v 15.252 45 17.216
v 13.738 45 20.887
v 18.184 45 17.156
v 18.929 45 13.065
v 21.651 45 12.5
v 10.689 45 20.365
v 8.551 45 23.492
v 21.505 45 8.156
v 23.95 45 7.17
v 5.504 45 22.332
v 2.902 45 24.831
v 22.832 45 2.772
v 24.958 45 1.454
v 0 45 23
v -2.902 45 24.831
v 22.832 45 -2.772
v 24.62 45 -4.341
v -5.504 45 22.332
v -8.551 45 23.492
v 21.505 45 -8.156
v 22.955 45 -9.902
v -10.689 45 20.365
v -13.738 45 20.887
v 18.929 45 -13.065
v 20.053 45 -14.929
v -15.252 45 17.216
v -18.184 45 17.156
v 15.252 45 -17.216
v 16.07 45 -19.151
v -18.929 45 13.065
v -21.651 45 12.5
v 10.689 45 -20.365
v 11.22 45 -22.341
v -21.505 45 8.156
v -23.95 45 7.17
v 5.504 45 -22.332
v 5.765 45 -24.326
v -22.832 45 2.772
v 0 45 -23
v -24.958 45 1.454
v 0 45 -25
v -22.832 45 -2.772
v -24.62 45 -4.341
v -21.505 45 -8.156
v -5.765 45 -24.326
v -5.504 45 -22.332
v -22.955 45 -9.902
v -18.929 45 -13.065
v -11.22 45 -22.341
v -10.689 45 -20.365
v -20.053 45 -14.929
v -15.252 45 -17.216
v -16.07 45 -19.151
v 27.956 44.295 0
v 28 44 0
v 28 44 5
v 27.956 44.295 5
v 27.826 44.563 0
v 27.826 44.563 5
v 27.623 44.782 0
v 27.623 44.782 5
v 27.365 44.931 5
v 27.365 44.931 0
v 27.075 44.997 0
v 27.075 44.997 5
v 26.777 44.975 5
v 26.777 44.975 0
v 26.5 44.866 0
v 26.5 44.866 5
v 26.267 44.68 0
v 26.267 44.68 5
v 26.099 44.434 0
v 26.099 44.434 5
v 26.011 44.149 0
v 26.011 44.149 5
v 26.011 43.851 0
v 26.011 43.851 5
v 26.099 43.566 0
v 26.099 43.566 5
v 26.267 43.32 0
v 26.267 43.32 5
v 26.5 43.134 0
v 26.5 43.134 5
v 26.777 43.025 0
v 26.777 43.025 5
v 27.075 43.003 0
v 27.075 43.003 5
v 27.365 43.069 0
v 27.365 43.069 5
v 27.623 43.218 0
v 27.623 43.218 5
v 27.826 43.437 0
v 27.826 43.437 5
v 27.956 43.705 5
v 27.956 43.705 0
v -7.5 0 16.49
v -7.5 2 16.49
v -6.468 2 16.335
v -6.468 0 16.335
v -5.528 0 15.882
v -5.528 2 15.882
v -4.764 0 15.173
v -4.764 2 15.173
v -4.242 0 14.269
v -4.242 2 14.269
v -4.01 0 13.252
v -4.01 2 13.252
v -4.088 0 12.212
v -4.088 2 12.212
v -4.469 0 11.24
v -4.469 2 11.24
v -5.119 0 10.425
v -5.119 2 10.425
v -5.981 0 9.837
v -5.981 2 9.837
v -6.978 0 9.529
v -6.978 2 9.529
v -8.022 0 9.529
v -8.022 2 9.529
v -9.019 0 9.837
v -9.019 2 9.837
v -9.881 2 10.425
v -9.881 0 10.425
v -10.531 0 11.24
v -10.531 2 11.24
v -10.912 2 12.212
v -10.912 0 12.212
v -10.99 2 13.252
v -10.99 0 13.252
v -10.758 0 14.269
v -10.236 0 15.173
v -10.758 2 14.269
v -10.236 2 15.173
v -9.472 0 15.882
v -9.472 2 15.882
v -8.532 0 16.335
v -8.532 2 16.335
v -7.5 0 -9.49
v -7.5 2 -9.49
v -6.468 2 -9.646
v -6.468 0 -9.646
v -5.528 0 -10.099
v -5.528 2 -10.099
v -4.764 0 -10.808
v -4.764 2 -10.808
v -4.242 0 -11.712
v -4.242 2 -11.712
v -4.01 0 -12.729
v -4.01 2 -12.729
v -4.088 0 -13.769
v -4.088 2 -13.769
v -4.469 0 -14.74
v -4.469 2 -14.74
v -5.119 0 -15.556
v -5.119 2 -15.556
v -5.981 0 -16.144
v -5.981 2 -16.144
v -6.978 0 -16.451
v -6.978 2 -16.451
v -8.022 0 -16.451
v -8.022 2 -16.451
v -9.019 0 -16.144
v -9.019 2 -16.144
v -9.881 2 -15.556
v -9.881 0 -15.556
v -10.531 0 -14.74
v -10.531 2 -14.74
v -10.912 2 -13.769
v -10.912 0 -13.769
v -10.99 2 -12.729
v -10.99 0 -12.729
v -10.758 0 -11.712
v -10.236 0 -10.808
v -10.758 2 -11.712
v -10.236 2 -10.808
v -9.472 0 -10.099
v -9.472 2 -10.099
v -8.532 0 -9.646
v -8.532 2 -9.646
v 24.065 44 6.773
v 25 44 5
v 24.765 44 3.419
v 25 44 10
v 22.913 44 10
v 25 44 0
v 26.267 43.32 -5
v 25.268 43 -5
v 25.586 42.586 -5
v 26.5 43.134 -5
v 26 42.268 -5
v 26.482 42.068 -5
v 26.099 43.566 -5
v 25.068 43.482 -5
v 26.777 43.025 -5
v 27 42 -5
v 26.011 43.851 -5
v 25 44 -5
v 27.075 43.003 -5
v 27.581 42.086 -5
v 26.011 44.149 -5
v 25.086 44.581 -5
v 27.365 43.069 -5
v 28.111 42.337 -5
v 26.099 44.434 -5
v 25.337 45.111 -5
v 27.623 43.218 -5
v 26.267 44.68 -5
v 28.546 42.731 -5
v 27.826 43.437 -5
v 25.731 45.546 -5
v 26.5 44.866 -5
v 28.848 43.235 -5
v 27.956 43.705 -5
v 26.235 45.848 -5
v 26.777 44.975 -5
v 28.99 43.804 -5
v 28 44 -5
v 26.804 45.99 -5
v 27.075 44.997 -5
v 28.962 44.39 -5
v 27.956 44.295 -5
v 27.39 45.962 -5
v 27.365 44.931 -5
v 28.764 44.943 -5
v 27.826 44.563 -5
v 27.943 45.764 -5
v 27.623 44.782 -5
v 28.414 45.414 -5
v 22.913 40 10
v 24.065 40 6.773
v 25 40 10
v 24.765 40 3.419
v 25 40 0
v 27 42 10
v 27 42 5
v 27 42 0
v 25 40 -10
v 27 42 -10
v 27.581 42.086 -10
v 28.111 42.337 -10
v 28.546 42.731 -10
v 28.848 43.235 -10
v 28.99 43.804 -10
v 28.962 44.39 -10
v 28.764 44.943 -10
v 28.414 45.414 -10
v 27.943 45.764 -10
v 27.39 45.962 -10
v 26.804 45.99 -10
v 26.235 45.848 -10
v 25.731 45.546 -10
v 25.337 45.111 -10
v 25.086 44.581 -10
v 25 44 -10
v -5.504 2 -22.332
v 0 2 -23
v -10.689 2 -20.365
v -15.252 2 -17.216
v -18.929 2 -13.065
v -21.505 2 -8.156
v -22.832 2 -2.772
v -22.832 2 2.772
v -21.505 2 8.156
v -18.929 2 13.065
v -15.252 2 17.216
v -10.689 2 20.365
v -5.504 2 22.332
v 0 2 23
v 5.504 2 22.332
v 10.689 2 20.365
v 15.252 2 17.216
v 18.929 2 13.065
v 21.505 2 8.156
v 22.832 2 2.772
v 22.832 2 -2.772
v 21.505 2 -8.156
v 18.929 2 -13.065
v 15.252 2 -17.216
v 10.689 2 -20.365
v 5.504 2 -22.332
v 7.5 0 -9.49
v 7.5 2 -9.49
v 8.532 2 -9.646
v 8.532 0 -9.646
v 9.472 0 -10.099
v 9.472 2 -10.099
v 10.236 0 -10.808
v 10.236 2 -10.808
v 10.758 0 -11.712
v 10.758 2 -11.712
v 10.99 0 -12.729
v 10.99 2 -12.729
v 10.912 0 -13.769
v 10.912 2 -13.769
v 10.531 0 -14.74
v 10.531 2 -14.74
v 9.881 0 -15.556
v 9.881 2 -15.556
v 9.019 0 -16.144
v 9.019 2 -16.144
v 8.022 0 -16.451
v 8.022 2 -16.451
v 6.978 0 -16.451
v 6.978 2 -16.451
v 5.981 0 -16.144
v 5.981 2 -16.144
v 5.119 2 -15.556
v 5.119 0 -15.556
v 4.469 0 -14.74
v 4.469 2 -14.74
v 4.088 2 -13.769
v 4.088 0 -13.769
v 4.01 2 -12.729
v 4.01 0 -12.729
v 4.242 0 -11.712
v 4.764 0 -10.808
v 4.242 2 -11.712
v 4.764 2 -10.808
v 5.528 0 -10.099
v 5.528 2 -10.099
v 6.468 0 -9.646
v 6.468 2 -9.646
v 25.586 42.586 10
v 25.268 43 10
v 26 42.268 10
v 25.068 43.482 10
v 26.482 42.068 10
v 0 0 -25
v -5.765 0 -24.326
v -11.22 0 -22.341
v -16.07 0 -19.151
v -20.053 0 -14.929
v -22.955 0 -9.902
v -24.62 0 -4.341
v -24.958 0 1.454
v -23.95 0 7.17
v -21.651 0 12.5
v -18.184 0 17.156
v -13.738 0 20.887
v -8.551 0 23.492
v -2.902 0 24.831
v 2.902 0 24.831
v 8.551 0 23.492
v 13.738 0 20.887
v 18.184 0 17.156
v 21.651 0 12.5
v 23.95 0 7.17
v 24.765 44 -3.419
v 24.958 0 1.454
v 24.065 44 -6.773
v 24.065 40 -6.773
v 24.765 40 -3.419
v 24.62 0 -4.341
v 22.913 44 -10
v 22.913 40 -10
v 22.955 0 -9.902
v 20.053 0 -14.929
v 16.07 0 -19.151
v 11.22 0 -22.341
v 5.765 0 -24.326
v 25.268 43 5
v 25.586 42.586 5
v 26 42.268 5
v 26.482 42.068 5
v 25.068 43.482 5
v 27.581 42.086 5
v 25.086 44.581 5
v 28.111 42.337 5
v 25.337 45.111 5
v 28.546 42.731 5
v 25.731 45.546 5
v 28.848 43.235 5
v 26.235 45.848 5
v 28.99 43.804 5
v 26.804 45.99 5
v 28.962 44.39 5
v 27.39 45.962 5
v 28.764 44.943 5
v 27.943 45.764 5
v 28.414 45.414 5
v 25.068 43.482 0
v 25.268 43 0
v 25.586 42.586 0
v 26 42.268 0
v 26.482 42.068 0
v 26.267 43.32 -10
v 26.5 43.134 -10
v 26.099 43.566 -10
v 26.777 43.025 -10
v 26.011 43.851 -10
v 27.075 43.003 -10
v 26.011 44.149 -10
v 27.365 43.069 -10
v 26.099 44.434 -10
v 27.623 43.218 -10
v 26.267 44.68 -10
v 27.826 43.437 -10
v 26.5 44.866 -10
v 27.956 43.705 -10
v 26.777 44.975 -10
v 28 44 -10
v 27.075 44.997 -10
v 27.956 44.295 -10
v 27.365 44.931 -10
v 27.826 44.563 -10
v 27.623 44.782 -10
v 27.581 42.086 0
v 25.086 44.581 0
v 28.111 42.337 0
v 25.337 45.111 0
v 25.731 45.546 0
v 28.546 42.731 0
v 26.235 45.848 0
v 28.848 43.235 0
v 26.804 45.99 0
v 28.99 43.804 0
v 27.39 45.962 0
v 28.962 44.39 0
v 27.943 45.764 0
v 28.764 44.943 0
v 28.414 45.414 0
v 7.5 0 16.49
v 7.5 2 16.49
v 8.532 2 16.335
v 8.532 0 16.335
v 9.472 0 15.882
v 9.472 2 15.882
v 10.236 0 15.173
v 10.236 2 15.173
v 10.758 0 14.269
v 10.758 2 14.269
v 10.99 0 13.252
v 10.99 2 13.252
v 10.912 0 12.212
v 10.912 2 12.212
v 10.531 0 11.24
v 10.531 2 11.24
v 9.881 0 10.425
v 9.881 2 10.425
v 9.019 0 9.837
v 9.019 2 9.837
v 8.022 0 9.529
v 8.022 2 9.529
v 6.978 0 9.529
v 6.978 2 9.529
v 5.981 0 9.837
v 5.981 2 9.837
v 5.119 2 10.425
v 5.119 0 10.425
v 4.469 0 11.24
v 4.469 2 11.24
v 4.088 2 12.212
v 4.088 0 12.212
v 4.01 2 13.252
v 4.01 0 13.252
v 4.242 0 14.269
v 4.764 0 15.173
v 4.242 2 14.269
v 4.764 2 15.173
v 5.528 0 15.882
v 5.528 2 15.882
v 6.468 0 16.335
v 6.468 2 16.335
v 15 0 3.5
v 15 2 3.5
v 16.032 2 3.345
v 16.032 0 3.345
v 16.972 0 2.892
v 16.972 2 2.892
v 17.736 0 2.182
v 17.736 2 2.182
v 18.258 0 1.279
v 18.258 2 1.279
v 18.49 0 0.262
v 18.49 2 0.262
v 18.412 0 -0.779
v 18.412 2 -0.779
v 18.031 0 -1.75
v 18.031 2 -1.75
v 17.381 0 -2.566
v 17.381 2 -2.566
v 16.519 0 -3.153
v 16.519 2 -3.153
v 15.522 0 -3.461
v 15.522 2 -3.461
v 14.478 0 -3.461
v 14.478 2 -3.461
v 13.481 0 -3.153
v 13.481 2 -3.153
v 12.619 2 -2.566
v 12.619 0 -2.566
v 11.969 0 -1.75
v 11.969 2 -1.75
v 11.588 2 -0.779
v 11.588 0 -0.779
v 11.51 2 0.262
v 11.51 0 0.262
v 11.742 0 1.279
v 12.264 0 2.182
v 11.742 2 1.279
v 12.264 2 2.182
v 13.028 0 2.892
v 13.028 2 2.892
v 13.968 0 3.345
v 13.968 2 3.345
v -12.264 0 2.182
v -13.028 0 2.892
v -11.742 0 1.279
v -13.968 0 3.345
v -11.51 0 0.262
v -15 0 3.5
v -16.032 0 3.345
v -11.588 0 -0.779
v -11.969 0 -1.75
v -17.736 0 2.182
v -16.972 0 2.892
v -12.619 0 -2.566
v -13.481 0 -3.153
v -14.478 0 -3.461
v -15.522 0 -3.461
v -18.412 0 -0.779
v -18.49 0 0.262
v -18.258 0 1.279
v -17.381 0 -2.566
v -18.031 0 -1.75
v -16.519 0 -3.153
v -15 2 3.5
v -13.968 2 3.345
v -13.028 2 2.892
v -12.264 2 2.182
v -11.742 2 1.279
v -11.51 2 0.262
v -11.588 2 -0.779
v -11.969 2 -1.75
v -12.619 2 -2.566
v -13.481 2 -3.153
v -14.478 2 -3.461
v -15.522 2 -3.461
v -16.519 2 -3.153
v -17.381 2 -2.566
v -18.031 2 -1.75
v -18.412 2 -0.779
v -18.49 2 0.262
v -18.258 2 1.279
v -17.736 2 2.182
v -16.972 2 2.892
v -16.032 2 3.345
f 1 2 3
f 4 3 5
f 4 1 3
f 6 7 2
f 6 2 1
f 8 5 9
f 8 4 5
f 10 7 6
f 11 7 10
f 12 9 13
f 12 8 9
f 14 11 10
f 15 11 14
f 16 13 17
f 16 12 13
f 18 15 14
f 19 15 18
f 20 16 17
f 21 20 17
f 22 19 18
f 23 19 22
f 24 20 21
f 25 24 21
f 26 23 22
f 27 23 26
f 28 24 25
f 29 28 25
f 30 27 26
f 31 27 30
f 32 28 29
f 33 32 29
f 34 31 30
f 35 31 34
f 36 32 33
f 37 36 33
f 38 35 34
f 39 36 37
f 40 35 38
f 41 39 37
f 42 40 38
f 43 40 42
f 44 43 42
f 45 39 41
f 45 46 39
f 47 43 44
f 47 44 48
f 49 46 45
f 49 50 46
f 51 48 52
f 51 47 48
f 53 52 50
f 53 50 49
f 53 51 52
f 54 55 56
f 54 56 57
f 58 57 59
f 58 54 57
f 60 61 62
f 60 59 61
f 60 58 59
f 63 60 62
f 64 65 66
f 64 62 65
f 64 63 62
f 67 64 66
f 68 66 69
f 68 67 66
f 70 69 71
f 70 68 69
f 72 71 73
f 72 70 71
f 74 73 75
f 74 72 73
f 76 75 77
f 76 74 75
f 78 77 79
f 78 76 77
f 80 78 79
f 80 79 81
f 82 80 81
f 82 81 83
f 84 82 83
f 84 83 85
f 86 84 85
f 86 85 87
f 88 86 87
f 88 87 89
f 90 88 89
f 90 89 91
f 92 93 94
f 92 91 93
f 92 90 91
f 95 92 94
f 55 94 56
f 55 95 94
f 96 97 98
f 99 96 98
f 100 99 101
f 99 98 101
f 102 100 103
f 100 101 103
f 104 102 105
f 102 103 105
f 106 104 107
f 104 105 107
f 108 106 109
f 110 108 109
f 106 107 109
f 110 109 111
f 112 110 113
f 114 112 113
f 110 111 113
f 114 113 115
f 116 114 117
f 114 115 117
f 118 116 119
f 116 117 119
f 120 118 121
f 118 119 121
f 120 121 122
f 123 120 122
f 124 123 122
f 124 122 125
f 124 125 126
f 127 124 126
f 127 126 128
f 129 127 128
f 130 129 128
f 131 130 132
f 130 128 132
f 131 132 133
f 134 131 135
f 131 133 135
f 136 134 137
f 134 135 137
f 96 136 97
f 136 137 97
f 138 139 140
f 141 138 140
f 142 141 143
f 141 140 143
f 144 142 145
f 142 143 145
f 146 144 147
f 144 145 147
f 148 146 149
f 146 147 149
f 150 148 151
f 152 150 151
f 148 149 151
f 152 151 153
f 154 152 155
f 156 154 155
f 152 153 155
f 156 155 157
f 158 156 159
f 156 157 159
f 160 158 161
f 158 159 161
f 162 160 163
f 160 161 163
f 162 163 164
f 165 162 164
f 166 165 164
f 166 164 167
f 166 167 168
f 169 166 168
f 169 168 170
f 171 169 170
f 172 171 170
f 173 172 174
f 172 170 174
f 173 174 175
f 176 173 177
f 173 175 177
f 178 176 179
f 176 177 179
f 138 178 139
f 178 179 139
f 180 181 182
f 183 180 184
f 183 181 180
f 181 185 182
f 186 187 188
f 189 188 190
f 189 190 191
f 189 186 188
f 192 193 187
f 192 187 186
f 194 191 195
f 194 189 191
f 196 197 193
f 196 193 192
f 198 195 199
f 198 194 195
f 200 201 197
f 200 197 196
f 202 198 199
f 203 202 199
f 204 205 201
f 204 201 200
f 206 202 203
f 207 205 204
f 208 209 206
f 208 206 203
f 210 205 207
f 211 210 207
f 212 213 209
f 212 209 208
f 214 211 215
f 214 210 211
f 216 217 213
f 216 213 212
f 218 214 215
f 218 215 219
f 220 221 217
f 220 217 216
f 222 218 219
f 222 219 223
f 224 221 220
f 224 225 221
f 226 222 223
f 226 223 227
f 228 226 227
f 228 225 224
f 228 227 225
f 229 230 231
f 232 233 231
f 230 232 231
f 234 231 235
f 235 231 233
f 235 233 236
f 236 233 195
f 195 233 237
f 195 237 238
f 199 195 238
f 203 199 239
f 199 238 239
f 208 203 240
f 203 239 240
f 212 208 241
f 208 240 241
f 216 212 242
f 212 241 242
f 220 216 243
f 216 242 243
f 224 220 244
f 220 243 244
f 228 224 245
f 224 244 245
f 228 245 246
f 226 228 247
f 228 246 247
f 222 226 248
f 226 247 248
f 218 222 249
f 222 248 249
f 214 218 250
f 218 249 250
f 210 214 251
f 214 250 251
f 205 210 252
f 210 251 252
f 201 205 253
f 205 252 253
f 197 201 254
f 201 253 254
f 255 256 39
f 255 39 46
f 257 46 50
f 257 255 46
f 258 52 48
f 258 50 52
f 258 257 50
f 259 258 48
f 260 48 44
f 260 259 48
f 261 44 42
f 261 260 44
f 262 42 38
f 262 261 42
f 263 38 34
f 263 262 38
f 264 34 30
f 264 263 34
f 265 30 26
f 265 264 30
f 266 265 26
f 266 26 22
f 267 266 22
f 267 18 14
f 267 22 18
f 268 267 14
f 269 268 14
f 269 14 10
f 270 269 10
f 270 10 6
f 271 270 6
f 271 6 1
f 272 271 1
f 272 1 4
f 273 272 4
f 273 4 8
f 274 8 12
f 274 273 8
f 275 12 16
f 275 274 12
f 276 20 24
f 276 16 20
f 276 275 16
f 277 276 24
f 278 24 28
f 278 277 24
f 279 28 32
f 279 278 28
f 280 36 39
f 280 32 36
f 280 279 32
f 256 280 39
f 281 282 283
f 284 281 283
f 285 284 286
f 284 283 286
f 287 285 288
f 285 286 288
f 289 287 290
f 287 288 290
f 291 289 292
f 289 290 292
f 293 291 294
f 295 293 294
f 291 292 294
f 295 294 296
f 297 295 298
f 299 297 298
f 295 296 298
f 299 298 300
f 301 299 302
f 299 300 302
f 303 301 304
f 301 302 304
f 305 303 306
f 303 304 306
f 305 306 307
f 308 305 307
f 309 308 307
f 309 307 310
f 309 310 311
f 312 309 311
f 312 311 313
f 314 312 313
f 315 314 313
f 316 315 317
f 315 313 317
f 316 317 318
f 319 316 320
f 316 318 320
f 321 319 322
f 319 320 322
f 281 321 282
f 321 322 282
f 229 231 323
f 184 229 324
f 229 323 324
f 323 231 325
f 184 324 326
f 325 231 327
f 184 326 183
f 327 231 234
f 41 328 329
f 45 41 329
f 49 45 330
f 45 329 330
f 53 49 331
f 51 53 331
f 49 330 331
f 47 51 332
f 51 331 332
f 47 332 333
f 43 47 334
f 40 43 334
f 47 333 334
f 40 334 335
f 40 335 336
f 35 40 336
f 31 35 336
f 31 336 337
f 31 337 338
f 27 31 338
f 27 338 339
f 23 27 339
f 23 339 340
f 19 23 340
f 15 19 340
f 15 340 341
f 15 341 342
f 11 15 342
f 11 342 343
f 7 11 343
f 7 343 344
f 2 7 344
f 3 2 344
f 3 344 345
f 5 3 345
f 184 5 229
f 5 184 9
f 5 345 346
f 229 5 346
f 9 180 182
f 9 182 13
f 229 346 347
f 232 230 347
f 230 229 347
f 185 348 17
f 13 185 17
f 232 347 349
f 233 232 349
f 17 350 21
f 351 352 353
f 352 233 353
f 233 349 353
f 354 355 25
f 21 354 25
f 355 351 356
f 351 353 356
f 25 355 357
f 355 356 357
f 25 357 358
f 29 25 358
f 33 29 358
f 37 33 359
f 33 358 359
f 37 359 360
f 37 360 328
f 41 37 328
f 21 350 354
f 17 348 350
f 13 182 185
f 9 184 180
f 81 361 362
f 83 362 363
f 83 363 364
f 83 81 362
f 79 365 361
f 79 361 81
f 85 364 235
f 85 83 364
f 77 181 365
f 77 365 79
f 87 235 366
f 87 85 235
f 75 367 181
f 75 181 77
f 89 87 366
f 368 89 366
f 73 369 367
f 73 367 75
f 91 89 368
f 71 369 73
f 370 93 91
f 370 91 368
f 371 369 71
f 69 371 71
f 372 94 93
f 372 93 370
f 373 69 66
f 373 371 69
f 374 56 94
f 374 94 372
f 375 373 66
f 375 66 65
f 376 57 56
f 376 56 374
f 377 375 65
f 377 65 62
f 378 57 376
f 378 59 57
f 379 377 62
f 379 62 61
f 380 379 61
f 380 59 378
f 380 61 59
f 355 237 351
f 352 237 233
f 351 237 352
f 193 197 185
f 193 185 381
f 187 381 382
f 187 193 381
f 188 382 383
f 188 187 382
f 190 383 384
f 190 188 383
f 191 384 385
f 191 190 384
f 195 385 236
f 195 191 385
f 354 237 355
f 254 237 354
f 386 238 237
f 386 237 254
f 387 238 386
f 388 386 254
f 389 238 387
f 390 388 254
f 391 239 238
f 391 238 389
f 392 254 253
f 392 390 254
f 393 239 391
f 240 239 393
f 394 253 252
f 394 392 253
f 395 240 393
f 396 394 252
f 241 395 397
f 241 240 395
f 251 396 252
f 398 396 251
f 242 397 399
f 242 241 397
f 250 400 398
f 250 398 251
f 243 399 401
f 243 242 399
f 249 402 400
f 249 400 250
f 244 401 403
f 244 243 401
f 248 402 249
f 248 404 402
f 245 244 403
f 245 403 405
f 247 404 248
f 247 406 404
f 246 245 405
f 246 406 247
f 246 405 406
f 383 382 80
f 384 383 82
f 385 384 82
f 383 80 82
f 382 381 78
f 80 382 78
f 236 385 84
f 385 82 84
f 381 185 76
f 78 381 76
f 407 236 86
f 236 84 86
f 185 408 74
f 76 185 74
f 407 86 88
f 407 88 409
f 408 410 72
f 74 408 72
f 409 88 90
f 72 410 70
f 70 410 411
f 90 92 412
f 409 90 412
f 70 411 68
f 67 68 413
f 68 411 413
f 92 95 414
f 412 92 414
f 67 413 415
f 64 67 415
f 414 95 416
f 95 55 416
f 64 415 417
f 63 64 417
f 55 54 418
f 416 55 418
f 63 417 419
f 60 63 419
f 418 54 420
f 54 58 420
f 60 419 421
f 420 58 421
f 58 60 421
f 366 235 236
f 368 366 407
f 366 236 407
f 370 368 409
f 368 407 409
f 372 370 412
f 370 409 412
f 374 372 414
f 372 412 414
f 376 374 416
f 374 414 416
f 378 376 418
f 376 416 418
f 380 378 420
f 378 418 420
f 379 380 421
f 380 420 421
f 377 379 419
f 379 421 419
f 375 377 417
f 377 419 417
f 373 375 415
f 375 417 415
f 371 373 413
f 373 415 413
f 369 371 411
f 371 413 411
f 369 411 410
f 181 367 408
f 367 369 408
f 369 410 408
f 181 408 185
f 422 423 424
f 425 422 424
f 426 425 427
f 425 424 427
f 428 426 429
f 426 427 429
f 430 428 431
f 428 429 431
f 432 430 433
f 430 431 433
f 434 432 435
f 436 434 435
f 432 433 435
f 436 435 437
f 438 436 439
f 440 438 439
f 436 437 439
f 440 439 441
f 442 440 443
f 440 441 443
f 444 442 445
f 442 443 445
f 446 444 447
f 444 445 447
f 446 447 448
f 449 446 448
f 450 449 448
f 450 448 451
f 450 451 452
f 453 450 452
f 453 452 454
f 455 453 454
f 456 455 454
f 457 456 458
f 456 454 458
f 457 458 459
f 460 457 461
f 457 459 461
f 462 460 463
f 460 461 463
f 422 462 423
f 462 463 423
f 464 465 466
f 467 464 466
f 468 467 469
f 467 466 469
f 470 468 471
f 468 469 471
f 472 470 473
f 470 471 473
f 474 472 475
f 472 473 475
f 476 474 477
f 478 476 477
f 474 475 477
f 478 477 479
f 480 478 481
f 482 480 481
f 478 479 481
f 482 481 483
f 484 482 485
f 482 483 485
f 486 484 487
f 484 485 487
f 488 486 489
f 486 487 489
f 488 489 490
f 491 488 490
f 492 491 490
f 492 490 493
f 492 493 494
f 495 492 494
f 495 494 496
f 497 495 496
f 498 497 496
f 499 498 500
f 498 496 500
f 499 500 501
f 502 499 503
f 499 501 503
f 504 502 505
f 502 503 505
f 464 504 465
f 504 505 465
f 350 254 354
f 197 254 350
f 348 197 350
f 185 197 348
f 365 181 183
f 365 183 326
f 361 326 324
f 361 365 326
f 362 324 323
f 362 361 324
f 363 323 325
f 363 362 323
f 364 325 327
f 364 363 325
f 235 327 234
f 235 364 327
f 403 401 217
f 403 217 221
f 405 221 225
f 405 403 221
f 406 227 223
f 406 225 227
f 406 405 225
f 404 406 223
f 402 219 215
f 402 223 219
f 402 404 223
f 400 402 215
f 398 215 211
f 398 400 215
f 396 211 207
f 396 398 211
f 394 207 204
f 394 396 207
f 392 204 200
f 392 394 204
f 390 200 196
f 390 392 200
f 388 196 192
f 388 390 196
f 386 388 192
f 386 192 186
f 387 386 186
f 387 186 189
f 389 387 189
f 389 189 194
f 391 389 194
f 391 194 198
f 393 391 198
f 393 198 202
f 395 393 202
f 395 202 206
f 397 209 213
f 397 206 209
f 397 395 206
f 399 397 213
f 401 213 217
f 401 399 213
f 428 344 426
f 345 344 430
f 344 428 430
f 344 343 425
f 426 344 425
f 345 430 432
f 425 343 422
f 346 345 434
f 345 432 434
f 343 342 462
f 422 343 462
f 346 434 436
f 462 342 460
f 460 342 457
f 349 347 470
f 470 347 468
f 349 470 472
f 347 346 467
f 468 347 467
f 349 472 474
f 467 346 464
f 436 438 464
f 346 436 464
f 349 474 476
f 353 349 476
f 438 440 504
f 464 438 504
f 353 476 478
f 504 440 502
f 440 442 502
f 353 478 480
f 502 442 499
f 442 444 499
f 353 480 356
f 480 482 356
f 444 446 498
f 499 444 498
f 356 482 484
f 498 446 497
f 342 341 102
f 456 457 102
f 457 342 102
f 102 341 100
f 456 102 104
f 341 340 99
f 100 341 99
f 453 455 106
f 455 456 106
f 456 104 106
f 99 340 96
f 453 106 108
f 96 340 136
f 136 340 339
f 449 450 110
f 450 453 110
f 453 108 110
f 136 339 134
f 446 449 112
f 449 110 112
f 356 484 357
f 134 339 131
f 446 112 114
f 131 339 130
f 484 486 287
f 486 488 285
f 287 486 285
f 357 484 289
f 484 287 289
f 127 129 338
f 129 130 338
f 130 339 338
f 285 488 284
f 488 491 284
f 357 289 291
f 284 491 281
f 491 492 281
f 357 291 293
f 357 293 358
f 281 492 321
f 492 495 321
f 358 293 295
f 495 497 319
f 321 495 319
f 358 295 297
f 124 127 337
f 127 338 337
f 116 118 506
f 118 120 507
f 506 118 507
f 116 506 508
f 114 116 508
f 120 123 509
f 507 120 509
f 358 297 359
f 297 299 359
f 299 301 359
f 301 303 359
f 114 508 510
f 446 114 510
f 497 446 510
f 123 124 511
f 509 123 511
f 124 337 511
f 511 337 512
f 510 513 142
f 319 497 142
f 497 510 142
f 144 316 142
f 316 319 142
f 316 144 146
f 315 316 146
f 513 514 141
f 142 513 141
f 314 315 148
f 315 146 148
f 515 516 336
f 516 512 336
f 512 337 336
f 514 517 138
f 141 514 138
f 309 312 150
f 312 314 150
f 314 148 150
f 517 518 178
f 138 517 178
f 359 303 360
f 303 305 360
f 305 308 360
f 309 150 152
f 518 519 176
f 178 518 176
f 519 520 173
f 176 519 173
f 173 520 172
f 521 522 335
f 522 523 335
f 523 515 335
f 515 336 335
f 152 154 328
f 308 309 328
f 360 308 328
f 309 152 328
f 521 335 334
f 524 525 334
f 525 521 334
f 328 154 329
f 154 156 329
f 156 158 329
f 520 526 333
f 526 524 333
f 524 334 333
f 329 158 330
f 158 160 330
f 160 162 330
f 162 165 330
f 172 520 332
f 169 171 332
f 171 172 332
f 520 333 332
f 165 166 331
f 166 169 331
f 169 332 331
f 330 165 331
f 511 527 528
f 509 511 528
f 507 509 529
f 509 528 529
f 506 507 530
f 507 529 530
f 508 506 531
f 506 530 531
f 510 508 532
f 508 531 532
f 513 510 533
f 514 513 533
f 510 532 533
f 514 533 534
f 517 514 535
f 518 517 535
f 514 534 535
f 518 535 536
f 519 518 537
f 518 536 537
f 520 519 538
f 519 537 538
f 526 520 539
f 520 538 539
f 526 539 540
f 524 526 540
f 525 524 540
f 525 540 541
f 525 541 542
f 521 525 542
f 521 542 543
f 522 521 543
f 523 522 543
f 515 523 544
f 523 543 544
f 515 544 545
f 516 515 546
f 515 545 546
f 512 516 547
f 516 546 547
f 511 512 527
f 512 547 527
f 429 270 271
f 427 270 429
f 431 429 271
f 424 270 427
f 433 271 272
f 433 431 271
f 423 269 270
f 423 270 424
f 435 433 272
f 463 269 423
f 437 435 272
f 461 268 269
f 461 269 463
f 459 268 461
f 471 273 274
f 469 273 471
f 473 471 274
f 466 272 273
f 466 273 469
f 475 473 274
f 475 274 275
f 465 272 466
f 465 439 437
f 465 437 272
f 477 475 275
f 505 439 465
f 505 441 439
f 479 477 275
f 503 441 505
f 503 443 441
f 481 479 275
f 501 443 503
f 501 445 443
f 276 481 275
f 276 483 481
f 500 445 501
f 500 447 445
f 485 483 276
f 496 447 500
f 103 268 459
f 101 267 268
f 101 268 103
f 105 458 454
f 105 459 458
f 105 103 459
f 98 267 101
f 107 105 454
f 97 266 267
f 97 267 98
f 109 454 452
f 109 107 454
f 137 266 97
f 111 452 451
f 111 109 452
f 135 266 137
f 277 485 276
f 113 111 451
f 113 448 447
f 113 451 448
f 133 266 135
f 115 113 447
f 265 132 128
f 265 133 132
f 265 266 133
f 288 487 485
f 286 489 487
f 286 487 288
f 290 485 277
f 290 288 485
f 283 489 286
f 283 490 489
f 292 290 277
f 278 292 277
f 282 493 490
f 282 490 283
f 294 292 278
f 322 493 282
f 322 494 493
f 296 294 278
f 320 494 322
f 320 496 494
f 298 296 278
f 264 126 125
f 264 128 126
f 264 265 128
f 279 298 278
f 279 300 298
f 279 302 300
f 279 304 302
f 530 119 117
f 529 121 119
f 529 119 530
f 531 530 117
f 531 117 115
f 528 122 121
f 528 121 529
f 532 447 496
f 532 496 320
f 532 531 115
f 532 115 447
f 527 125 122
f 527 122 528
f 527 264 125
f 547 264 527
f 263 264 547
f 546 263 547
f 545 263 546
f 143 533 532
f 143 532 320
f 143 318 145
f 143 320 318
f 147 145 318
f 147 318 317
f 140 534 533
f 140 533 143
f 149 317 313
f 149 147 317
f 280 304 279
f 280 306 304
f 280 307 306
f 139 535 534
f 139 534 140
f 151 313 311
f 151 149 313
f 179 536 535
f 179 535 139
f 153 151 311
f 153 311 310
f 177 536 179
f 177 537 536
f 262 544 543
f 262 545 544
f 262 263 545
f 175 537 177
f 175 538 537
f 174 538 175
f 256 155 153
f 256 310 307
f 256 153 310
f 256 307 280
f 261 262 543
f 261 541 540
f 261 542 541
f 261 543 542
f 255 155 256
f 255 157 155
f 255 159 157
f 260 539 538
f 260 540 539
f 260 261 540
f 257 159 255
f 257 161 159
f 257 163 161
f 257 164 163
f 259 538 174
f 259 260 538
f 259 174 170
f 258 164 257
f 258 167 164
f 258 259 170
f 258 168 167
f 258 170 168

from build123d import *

# Parameters (mm, degrees)
SKETCH1_R                = 25
BOSS_EXTRUDE1_DEPTH      = 45
SHELL1_T                 = -2
SKETCH2_R                = 3.5
CUT_EXTRUDE1_DEPTH       = 2
BOSS_EXTRUDE4_DEPTH      = 10
BOSS_EXTRUDE4_DEPTH_BACK = 10
BOSS_EXTRUDE6_REACH      = 74.395
SKETCH8_W                = 20
SKETCH8_H                = 4
CUT_EXTRUDE4_DEPTH       = 65.668384857
CUT_EXTRUDE4_DEPTH_BACK  = 65.668384857
SKETCH9_R                = 1
CUT_EXTRUDE5_START       = -5
SKETCH10_R               = 2
CUT_EXTRUDE5_DEPTH       = 5
LPATTERN2_COUNT          = 2
LPATTERN2_PITCH          = 10


with BuildPart() as part:
    # Sketch1 → Boss-Extrude1 (new body)
    with BuildSketch(Plane(origin=(0, 0, 0), x_dir=(1, 0, 0), z_dir=(0, 1, 0))):
        with Locations(Location((0, 0, 0), (0, 0, 90))):
            Circle(SKETCH1_R)
    extrude(amount=BOSS_EXTRUDE1_DEPTH)

    # Shell1
    shell1_openings = [part.faces().sort_by_distance(p)[0] for p in [
        (0, 45, 0),
    ]]
    offset(amount=SHELL1_T, openings=shell1_openings, kind=Kind.INTERSECTION)

    # Sketch2 → Cut-Extrude1 (cut)
    with BuildSketch(Plane(origin=(0, 2, 0), x_dir=(1, 0, 0), z_dir=(0, 1, 0))):
        with Locations(Location((15, 0, 0), (0, 0, 270))):
            Circle(SKETCH2_R)
        with Locations(Location((7.5, -12.990381057, 0), (0, 0, 270))):
            Circle(SKETCH2_R)
        with Locations(Location((-7.5, -12.990381057, 0), (0, 0, 270))):
            Circle(SKETCH2_R)
        with Locations(Location((-15, 0, 0), (0, 0, 270))):
            Circle(SKETCH2_R)
        with Locations(Location((-7.5, 12.990381057, 0), (0, 0, 270))):
            Circle(SKETCH2_R)
        with Locations(Location((7.5, 12.990381057, 0), (0, 0, 270))):
            Circle(SKETCH2_R)
    extrude(amount=-CUT_EXTRUDE1_DEPTH, mode=Mode.SUBTRACT)

    # Sketch8 → Boss-Extrude6 (add, up to next)
    with BuildSketch(Plane.ZY.offset(-25), mode=Mode.PRIVATE) as boss_extrude6_sk1:
        with Locations((0, 42)):
            Rectangle(SKETCH8_W, SKETCH8_H)
    boss_extrude6_tool1 = extrude(boss_extrude6_sk1.sketch, amount=BOSS_EXTRUDE6_REACH, mode=Mode.PRIVATE) - part.part


with BuildPart() as body_2:
    # Sketch3 → Boss-Extrude4 (new, two sides: drawn at the far end of the back side and taken through both)
    with BuildSketch(Plane.XY.offset(-BOSS_EXTRUDE4_DEPTH_BACK)):
        with BuildLine():
            Line((25, 44), (25, 40))
            Line((25, 40), (27, 42))
            ThreePointArc((27, 42), (28.414213562, 45.414213562), (25, 44))
        make_face()
    extrude(amount=BOSS_EXTRUDE4_DEPTH + BOSS_EXTRUDE4_DEPTH_BACK)


with BuildPart() as part_1:
    add(part.part)

    add(body_2.part)  # Boss-Extrude6 merges body 2
    add(boss_extrude6_tool1.solids().sort_by_distance((25, 42, 0))[0])
    add(boss_extrude6_tool1.solids().sort_by_distance((25, 42, 0))[1])

    # Sketch9 → Cut-Extrude4 (cut, two sides: drawn at the far end of the back side and taken through both)
    with BuildSketch(Plane.XY.offset(10).offset(-CUT_EXTRUDE4_DEPTH_BACK)):
        with Locations((27, 44)):
            Circle(SKETCH9_R)
    extrude(amount=CUT_EXTRUDE4_DEPTH + CUT_EXTRUDE4_DEPTH_BACK, mode=Mode.SUBTRACT)

    # Sketch10 → Cut-Extrude5 (cut)
    with BuildSketch(Plane.XY.offset(10).offset(CUT_EXTRUDE5_START)):
        with Locations((27, 44)):
            Circle(SKETCH10_R)
    cut_extrude5 = extrude(amount=CUT_EXTRUDE5_DEPTH, mode=Mode.SUBTRACT)

    # LPattern2: Cut-Extrude5 ×2
    with Locations(*[(0, 0, -i * LPATTERN2_PITCH) for i in range(1, LPATTERN2_COUNT)]):
        add(cut_extrude5, mode=Mode.SUBTRACT)


solid = part_1.part
